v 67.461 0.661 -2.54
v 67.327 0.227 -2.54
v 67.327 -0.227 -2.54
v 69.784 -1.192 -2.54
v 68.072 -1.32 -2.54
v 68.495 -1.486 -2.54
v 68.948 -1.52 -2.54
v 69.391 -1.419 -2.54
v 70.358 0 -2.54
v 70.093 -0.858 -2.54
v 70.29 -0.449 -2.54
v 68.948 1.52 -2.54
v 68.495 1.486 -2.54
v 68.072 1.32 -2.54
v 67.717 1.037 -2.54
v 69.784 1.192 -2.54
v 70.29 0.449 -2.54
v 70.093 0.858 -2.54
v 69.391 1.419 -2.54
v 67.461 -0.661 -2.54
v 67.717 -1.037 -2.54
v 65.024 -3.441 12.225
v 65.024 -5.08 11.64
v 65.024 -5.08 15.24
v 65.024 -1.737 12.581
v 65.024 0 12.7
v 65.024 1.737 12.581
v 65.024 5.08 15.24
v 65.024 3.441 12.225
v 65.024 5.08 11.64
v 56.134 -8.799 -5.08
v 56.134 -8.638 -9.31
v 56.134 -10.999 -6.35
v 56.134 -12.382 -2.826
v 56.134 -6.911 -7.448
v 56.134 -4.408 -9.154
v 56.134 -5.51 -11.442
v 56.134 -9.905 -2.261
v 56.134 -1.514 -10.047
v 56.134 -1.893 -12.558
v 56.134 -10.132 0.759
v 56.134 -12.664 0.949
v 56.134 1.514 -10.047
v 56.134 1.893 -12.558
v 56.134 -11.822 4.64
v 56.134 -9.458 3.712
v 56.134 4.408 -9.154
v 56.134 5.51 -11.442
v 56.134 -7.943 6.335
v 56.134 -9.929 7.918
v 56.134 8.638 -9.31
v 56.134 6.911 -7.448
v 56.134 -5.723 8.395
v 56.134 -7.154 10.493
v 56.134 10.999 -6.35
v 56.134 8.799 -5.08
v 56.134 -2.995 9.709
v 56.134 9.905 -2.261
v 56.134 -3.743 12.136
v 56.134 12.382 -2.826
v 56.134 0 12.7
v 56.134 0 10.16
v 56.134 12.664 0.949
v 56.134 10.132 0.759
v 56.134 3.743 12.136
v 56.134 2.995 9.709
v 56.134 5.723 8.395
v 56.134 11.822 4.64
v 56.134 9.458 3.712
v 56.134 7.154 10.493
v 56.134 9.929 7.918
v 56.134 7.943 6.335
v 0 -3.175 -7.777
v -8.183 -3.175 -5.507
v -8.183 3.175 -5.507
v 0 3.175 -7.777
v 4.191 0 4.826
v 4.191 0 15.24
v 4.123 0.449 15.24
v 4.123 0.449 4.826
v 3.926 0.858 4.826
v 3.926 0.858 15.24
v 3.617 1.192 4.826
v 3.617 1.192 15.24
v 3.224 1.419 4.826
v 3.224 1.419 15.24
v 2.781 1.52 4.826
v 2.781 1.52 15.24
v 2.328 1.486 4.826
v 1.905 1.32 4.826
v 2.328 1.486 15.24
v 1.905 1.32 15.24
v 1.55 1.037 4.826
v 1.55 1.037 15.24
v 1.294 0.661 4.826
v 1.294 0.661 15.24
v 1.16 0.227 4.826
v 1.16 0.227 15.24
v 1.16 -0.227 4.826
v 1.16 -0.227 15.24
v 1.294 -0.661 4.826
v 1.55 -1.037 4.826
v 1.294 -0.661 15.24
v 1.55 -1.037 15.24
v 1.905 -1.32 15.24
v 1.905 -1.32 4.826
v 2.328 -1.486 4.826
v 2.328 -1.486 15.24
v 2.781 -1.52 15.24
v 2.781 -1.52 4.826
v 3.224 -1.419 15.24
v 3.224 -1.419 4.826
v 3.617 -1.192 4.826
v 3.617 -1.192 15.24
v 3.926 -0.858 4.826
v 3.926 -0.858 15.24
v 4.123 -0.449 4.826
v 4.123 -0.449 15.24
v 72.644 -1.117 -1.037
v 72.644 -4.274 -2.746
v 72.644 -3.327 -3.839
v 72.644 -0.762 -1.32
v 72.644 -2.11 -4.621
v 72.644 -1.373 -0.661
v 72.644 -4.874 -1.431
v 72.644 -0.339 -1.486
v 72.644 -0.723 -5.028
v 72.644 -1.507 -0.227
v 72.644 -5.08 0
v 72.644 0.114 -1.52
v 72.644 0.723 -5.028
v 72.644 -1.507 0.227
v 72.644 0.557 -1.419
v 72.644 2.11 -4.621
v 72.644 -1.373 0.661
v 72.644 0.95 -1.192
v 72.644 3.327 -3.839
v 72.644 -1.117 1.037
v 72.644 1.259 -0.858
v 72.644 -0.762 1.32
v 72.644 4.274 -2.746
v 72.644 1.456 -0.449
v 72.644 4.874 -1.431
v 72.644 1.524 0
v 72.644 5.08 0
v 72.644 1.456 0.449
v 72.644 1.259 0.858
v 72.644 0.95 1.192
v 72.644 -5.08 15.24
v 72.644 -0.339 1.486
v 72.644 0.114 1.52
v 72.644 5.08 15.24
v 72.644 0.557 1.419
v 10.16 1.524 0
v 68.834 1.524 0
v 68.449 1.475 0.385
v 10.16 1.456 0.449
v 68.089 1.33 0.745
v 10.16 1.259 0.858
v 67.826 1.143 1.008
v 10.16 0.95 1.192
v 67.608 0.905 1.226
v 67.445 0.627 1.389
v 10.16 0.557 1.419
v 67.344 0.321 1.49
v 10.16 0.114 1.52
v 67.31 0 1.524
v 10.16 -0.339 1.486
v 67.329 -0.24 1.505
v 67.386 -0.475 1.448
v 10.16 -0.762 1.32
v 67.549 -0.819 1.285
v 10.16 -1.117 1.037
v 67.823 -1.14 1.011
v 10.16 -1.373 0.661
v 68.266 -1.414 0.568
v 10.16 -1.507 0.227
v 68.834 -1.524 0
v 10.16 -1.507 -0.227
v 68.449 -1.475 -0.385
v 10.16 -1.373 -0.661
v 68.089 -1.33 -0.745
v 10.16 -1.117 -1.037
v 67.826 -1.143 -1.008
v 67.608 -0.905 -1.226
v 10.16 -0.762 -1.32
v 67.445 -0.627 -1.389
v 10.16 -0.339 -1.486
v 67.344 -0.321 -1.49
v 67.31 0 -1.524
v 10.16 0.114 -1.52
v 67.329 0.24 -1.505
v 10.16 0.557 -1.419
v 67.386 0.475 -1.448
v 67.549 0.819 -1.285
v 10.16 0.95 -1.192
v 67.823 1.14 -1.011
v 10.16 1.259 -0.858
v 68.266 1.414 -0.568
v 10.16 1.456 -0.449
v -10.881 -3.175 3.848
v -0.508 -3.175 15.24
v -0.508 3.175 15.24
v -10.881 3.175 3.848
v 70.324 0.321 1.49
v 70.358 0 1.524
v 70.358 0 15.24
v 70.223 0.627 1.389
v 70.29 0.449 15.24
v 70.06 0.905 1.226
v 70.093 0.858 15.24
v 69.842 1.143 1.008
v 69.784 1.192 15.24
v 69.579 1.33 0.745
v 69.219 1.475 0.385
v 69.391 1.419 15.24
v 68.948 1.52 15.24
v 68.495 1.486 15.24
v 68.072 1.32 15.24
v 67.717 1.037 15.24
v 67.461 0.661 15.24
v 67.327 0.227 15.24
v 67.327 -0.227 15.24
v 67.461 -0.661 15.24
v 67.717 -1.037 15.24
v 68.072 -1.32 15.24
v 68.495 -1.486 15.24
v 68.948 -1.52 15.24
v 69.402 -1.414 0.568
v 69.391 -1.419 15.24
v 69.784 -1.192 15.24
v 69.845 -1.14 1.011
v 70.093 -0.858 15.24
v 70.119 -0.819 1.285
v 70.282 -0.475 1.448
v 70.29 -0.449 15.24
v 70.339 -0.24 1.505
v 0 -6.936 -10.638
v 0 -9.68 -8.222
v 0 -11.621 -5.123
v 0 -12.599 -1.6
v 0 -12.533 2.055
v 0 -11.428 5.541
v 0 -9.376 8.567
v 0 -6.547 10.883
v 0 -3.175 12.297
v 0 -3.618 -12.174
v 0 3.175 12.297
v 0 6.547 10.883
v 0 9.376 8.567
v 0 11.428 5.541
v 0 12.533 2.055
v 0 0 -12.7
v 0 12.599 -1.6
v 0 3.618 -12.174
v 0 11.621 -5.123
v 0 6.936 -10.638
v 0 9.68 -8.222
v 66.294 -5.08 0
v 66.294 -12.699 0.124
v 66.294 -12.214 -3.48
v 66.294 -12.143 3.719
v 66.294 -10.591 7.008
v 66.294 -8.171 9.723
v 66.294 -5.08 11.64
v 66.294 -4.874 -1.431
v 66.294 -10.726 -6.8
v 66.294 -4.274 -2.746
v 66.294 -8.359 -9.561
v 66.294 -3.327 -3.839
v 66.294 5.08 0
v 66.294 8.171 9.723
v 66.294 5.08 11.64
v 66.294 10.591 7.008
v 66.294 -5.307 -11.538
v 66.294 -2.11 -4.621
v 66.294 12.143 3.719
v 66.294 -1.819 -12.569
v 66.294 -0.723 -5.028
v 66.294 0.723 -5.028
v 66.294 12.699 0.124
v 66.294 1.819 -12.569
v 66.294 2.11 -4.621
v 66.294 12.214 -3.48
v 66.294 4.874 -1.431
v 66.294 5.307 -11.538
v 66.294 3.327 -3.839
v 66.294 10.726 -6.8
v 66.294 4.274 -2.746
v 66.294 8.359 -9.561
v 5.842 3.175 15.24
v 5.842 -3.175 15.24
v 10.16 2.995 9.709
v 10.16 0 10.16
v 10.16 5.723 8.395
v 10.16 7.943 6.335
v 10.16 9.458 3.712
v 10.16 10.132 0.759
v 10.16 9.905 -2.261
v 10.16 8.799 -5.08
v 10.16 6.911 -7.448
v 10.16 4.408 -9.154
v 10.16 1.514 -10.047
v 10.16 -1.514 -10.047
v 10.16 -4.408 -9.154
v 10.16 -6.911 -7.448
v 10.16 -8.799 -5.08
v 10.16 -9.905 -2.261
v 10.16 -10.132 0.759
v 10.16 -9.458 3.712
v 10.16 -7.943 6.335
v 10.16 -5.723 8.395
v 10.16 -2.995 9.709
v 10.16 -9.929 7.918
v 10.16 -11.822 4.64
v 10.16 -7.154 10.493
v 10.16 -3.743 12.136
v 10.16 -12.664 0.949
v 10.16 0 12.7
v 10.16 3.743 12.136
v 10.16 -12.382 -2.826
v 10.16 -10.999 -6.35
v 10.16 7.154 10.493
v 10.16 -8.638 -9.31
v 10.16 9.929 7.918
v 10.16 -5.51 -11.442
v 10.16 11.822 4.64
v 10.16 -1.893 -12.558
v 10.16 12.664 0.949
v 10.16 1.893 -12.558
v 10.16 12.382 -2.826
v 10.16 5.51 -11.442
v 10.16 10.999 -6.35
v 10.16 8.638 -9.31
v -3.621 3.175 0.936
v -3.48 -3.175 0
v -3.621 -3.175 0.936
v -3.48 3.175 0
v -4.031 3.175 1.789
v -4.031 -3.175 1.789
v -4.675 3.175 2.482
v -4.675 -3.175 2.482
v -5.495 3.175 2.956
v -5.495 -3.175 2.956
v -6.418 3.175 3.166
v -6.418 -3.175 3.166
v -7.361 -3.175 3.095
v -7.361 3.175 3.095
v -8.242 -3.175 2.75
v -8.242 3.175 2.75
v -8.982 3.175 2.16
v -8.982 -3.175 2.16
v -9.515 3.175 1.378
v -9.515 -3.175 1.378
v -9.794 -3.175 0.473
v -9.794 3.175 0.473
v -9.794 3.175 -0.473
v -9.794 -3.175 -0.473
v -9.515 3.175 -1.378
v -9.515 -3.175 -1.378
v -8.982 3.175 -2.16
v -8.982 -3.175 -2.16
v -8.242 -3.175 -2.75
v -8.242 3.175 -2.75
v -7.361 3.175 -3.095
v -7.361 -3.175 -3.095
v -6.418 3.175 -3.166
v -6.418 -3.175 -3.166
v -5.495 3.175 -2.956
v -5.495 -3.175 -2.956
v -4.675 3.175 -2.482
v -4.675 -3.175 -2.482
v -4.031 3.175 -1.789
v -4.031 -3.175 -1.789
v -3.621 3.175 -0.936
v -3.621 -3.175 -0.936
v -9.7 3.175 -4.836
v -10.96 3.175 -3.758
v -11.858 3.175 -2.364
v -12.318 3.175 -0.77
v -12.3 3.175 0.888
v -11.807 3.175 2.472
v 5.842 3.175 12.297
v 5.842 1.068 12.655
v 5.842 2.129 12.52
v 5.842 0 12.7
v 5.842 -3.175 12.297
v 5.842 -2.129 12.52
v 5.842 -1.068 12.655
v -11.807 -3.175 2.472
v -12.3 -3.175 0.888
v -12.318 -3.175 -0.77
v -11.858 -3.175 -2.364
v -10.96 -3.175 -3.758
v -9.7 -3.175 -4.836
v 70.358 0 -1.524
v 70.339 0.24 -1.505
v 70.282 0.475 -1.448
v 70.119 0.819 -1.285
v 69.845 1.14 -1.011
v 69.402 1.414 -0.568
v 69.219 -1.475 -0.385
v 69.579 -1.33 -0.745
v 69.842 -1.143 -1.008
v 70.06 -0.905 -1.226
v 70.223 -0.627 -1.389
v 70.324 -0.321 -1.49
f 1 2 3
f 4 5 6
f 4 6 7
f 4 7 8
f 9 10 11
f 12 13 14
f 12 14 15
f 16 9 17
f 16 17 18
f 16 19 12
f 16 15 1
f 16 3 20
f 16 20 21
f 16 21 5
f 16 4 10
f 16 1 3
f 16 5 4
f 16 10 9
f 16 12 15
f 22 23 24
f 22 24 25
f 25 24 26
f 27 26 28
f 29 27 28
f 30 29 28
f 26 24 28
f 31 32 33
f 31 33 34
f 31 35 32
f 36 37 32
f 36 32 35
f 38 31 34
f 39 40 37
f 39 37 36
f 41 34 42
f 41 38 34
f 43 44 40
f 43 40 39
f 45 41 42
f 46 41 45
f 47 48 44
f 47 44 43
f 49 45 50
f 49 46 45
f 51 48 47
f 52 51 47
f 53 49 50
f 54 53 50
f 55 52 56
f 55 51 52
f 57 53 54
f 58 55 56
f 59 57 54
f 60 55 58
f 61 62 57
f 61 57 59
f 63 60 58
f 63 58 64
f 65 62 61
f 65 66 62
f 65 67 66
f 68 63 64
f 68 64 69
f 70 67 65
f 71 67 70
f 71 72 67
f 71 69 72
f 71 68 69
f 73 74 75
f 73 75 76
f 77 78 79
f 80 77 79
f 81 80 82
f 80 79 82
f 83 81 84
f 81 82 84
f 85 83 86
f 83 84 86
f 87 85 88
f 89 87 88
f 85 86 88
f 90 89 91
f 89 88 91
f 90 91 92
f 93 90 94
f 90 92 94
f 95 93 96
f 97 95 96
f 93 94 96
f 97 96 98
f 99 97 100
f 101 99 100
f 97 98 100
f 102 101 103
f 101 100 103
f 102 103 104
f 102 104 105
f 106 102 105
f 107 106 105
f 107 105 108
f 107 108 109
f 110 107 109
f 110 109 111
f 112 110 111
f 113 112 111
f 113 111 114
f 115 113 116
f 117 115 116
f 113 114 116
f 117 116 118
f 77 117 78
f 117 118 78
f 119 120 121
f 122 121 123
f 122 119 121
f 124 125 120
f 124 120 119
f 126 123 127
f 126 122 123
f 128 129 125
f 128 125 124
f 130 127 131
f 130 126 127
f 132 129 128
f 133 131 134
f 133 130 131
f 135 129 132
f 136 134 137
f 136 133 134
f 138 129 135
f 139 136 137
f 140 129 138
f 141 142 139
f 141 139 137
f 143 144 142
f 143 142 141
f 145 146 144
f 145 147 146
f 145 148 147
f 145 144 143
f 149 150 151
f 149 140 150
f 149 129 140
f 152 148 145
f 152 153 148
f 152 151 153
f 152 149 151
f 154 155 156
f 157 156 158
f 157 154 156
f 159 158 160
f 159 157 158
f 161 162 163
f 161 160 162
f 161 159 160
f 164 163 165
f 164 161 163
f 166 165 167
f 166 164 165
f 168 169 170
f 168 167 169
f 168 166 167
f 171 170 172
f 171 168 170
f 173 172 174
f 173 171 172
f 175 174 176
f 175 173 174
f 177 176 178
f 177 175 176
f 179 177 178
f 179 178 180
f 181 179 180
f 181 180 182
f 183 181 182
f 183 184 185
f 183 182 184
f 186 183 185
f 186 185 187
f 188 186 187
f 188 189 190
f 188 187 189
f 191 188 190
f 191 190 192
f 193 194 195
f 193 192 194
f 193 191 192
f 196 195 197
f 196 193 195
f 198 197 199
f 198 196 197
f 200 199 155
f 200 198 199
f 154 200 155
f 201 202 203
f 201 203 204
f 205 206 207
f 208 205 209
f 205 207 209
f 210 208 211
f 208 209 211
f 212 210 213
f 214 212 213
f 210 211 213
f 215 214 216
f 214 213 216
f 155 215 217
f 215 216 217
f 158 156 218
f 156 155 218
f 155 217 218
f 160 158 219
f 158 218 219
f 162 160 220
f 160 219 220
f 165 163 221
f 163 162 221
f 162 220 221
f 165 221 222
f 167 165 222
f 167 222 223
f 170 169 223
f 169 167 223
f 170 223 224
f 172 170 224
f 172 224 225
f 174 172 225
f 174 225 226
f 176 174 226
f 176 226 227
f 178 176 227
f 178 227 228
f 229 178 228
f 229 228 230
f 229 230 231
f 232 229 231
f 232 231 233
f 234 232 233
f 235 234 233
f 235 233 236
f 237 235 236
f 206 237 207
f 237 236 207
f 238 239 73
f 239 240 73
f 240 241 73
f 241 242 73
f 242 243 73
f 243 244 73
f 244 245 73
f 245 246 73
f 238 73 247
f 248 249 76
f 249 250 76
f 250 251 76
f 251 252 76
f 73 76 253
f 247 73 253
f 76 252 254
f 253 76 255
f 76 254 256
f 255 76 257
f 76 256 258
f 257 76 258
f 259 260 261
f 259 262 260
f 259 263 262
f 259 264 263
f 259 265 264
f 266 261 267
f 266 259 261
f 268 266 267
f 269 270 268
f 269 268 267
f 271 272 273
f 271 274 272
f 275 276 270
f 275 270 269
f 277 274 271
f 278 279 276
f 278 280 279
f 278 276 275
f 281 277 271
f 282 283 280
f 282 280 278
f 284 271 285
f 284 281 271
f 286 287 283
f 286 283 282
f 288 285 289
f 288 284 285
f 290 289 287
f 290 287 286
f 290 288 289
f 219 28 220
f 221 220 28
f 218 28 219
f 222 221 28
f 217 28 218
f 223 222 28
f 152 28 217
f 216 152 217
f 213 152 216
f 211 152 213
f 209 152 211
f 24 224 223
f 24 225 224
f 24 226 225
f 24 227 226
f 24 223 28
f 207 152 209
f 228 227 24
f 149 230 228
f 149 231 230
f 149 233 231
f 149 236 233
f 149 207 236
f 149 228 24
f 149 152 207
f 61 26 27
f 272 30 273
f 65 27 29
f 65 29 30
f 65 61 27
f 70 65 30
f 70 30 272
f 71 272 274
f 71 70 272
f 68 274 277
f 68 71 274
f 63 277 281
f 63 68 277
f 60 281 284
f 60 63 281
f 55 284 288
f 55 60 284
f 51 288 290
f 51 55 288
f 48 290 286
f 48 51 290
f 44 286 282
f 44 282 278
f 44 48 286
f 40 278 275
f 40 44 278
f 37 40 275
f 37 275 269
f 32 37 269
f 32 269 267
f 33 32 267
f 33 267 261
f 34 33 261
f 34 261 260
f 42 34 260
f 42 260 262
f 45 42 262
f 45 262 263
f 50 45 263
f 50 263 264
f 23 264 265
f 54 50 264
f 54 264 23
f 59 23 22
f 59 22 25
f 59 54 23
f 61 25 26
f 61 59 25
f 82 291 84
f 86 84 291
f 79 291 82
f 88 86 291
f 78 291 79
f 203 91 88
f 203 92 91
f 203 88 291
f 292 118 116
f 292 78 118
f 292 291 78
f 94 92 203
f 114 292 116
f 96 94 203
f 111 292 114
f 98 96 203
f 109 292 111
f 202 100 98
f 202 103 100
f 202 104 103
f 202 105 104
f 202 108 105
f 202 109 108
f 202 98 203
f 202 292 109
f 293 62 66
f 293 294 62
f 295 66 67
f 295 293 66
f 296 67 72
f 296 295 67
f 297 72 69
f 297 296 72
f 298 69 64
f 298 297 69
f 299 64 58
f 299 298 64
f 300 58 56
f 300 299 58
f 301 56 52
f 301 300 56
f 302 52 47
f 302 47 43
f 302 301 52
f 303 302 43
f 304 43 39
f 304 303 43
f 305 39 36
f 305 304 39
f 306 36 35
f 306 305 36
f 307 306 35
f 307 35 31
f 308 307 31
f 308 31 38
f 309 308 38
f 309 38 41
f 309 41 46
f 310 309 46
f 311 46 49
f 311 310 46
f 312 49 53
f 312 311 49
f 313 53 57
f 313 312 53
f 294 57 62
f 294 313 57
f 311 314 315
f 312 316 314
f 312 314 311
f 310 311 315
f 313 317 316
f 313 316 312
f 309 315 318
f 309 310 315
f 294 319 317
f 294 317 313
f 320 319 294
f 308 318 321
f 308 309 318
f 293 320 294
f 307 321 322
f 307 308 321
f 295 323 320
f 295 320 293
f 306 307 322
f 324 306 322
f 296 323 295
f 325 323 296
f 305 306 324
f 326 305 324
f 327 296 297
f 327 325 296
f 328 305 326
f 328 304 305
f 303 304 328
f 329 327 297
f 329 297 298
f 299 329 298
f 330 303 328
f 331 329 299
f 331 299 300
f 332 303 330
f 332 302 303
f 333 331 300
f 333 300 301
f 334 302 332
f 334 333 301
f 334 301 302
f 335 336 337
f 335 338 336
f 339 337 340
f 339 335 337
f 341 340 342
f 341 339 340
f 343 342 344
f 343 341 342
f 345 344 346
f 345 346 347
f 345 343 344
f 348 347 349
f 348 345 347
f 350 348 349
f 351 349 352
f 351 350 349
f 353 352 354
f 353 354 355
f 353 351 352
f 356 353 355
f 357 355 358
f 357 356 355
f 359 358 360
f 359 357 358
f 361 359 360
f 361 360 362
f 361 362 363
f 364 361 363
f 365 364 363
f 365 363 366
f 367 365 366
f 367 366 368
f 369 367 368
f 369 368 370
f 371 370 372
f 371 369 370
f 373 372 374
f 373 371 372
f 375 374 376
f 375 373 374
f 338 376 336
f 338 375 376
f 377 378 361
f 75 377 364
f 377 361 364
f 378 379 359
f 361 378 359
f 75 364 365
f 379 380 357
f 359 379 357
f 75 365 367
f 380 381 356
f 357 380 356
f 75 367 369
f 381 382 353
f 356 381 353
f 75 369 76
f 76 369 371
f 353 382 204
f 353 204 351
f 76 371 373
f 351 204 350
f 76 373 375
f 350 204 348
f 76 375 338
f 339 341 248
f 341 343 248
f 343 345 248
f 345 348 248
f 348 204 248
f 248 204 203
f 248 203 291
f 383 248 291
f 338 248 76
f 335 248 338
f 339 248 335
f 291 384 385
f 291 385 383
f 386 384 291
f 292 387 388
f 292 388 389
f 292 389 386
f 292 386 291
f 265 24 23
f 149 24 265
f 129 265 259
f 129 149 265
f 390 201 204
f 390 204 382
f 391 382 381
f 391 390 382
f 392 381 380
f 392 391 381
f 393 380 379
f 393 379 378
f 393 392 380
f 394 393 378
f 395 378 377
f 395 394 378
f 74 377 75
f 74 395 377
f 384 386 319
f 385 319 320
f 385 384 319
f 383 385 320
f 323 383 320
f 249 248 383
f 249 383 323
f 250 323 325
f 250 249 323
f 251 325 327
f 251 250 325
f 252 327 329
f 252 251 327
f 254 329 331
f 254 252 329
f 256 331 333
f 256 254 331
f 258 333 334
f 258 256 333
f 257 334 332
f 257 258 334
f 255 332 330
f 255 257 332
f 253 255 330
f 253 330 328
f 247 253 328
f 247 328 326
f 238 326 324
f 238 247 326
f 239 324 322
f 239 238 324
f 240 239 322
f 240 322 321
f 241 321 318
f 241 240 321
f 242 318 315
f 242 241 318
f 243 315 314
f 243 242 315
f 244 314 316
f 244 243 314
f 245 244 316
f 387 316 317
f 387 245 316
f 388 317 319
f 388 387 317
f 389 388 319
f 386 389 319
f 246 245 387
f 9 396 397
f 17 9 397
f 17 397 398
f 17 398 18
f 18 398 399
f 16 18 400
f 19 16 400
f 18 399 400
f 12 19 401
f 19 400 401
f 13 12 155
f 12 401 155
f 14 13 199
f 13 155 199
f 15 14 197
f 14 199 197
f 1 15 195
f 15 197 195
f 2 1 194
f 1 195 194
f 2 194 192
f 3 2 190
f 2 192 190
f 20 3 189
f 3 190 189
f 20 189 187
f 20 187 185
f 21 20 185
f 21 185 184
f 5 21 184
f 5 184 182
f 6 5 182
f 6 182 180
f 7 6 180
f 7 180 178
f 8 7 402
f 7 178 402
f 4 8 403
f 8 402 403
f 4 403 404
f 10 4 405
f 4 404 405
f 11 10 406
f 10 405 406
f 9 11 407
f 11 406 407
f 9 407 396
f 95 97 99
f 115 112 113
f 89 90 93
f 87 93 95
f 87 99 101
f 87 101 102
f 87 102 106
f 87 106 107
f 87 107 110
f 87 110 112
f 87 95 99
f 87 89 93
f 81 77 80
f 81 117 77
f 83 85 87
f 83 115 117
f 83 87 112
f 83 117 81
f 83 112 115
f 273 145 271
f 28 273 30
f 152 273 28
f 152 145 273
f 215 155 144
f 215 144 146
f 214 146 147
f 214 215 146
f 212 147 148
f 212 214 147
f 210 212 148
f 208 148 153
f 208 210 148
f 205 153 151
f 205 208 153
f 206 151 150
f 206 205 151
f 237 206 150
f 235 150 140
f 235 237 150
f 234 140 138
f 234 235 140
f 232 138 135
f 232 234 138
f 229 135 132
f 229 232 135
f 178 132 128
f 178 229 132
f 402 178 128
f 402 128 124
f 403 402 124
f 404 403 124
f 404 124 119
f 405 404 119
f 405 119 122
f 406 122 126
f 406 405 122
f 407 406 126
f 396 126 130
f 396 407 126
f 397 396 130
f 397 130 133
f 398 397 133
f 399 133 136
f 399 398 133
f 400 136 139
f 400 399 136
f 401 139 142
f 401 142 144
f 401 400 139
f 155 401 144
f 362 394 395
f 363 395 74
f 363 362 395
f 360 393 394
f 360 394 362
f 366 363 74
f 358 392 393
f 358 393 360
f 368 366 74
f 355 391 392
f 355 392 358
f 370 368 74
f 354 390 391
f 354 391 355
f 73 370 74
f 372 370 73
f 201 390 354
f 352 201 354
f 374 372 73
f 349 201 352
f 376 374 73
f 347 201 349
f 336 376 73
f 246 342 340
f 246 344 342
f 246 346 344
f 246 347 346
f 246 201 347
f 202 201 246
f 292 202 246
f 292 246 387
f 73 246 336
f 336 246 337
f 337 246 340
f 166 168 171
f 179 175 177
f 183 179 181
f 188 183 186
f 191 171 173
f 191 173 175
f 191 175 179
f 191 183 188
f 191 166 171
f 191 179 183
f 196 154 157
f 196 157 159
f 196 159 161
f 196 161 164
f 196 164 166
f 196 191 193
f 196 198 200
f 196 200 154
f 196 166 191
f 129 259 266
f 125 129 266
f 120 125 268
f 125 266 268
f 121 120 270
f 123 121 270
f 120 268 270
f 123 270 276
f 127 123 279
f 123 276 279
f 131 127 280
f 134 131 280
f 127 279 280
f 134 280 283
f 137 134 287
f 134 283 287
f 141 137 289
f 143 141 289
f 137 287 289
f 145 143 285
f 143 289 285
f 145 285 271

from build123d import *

# Parameters (mm, degrees)
F0_W          = 5.842
F0_H          = 12.7
F0_R          = 3.175
F2_DEPTH      = 3.175
F3_R          = 1.524
F4_DEPTH      = 6.35
F4_DEPTH_BACK = 1.27
F5_R          = 1.524
F7_DEPTH      = 17.78
F6_R          = 1.524
F8_DEPTH      = 10.414
F9_DEPTH      = 56.134


with BuildPart() as f1:
    # F0 (on Front) → F1 (revolve)
    with BuildSketch(Plane.XZ):
        Polygon((5.842, 12.7), (5.842, 0), (66.294, 0), (66.294, 12.7), (56.134, 12.7), (56.134, 10.16), (10.16, 10.16), (10.16, 12.7), align=None)
        with Locations((2.921, 6.35)):
            Rectangle(F0_W, F0_H)
    revolve(axis=Axis((33.147, 0, 0), (-1, 0, 0)))

    # F0 (on Front) → F2 (join, symmetric)
    with BuildSketch(Plane.XZ):
        with Locations((2.921, 6.35)):
            Rectangle(F0_W, F0_H)
        with BuildLine():
            Line((-0.9398, 0), (0, 0))
            Line((0, 0), (0, 12.7))
            Line((0, 12.7), (5.842, 12.7))
            Line((5.842, 12.7), (5.842, 15.24))
            Line((5.842, 15.24), (-0.508, 15.24))
            Line((-0.508, 15.24), (-10.8806298187, 3.8475430269))
            ThreePointArc((-10.8806298187, 3.8475430269), (-4.5919612295, 5.3297205562), (-0.9398, 0))
        make_face()
        with BuildLine():
            Line((5.842, 0), (0, 0))
            Line((0, 0), (-0.9398, 0))
            ThreePointArc((-0.9398, 0), (-3.1957909266, -4.5493385486), (-8.1826630726, -5.5069827884))
            Line((-8.1826630726, -5.5069827884), (5.842, -9.398))
            Line((5.842, -9.398), (5.842, 0))
        make_face()
        with BuildLine():
            ThreePointArc((-8.1826630726, -5.5069827884), (-3.1957909266, -4.5493385486), (-0.9398, 0))
            ThreePointArc((-0.9398, 0), (-4.5919612295, 5.3297205562), (-10.8806298187, 3.8475430269))
            ThreePointArc((-10.8806298187, 3.8475430269), (-12.1459778134, -1.5837270034), (-8.1826630726, -5.5069827884))
        make_face()
        with Locations((-6.6548, 0)):
            Circle(F0_R, mode=Mode.SUBTRACT)
    extrude(amount=F2_DEPTH, both=True)

    # F3 (on face) → F4 (join, two sides)
    with BuildSketch(Plane.YZ.offset(66.294)) as f4_sk:
        with BuildLine():
            ThreePointArc((-5.08, 0), (0, -5.08), (5.08, 0))
            ThreePointArc((5.08, 0), (0, 5.08), (-5.08, 0))
        make_face()
        Circle(F3_R, mode=Mode.SUBTRACT)
        with BuildLine():
            ThreePointArc((-5.08, 0), (0, 5.08), (5.08, 0))
            Line((5.08, 0), (5.08, 15.24))
            Line((5.08, 15.24), (-5.08, 15.24))
            Line((-5.08, 15.24), (-5.08, 0))
        make_face()
    extrude(amount=F4_DEPTH)
    extrude(f4_sk.sketch, amount=-F4_DEPTH_BACK)

    # F5 (on face) → F7 (cut)
    with BuildSketch(Plane.XY.offset(15.24)):
        with Locations((68.834, 0)):
            Circle(F5_R)
    extrude(amount=-F7_DEPTH, mode=Mode.SUBTRACT)

    # F6 (on face) → F8 (cut)
    with BuildSketch(Plane.XY.offset(15.24)):
        with Locations((2.667, 0)):
            Circle(F6_R)
    extrude(amount=-F8_DEPTH, mode=Mode.SUBTRACT)

    # F9 (cut, through all): a face of the model
    f9_faces = [f1.faces().sort_by_distance(p)[0] for p in [
        (66.294, 0, 0),
    ]]
    extrude(f9_faces, amount=-F9_DEPTH, mode=Mode.SUBTRACT)


solid = f1.part
